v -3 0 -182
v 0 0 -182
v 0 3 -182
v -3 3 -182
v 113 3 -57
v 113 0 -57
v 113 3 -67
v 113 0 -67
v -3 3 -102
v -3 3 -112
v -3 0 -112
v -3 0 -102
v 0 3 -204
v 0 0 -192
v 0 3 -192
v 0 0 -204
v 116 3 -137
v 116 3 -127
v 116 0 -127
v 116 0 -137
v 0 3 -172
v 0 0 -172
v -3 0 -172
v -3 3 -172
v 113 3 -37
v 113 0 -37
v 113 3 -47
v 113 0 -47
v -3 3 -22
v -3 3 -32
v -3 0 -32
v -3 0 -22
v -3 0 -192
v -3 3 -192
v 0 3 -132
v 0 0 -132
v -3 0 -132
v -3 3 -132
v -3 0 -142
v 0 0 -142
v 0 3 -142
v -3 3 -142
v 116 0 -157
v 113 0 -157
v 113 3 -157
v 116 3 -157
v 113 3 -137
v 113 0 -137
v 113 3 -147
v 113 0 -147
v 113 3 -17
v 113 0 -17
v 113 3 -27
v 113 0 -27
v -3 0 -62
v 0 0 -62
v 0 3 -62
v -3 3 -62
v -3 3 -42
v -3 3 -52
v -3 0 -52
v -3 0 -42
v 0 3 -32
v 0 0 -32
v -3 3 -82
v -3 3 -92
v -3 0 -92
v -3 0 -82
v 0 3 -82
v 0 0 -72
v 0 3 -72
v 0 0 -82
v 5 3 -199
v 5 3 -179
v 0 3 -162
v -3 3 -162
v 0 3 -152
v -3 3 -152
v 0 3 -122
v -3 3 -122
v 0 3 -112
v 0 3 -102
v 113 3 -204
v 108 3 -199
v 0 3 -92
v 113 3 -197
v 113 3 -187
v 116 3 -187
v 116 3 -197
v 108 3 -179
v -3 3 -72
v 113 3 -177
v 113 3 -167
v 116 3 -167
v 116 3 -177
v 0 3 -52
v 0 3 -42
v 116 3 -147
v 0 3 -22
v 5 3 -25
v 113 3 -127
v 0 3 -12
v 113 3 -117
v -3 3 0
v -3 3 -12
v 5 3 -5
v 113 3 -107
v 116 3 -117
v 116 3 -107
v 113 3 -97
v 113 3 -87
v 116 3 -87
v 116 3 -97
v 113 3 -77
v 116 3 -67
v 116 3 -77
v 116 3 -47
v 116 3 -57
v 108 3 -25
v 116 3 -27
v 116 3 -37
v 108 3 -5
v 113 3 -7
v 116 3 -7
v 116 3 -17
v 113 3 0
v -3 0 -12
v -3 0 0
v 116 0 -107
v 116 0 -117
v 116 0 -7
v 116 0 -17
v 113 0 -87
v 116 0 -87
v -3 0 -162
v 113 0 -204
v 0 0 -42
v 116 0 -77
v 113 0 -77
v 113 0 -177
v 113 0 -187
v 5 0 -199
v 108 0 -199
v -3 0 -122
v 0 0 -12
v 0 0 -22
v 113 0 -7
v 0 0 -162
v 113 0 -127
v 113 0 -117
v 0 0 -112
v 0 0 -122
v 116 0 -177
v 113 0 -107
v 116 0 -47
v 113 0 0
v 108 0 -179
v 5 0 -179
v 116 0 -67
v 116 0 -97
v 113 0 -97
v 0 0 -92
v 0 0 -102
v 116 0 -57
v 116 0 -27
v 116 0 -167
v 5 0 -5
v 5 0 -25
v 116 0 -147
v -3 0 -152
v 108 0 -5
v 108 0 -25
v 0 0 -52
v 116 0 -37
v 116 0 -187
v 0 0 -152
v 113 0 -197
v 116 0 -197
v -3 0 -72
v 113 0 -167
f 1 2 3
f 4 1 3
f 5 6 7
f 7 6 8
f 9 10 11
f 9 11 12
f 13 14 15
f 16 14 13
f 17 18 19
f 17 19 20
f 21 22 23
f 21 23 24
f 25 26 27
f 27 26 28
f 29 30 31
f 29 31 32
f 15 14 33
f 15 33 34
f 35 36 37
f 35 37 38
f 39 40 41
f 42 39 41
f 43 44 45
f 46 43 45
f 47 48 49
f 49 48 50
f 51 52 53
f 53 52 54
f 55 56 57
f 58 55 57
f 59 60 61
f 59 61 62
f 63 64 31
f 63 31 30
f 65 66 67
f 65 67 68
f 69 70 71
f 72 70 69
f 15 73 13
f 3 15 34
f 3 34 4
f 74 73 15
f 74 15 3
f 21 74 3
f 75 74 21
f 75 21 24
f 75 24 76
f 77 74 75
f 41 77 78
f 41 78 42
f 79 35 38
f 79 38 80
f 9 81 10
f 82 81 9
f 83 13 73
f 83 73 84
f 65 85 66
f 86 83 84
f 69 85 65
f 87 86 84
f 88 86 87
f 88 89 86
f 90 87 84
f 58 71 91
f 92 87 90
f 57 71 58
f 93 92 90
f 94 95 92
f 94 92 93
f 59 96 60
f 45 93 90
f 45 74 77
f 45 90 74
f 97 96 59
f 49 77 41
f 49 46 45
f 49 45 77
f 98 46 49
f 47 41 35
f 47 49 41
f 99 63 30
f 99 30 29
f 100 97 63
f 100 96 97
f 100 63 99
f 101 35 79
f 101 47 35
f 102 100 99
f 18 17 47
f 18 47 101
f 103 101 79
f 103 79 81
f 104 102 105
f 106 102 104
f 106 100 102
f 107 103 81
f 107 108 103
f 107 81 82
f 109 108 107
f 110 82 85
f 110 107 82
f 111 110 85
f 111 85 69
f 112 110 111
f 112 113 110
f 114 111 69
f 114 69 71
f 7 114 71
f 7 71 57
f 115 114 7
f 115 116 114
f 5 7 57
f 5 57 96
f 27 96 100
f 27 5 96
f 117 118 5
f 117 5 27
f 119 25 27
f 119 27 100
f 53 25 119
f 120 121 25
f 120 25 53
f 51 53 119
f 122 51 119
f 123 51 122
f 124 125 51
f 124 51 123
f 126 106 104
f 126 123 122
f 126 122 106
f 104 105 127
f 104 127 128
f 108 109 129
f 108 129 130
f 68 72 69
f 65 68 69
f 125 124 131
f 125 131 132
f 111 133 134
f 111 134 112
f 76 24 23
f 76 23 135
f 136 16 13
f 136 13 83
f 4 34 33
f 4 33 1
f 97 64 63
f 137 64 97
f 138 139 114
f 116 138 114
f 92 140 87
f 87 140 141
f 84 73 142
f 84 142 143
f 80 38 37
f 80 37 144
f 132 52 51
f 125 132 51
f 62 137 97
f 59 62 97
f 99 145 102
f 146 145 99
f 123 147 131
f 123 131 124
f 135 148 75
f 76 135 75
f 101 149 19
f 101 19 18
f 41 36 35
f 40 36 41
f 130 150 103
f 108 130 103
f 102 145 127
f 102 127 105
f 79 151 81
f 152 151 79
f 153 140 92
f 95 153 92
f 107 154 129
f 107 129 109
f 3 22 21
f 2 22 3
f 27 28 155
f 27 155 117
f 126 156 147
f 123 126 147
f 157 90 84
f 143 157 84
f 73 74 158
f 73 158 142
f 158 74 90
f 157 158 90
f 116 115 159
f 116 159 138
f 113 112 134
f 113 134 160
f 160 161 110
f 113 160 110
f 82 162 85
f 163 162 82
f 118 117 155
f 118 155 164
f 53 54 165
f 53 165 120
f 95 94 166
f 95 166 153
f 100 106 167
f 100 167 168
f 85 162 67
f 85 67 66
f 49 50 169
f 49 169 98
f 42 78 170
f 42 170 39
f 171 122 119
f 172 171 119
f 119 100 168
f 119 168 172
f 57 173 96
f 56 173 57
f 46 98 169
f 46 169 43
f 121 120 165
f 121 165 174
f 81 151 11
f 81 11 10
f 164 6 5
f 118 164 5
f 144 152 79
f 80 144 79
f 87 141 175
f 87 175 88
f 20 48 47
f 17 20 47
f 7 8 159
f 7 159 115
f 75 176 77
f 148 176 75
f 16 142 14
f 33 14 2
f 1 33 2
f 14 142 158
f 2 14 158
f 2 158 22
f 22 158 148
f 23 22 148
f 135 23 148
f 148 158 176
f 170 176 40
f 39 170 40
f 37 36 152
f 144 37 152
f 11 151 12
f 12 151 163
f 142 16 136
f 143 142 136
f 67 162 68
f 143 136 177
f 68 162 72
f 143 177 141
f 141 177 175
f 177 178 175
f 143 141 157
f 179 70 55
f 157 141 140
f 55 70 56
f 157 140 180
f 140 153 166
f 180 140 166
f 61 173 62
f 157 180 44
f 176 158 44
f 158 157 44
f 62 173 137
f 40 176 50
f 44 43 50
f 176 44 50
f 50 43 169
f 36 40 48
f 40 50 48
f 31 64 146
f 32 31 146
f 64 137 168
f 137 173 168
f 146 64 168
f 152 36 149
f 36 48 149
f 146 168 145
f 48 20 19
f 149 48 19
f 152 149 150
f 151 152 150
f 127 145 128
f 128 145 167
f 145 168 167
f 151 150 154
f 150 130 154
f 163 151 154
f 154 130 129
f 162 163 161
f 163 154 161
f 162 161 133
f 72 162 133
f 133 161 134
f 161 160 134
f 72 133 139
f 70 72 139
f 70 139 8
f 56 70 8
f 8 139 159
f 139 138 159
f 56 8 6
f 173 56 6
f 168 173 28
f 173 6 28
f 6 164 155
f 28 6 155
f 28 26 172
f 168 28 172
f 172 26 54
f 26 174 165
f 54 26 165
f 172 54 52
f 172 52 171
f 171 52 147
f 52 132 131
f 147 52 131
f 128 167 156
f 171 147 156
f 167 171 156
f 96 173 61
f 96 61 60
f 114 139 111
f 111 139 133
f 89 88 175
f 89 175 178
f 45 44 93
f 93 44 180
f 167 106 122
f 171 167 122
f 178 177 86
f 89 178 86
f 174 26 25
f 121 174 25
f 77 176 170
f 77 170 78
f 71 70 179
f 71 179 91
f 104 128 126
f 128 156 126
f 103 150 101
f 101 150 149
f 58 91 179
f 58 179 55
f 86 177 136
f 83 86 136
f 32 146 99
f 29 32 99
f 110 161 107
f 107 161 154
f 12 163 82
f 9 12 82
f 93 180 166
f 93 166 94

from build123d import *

# Parameters (mm, degrees)
SKETCH1_W           = 113
SKETCH1_H           = 204
BOSS_EXTRUDE1_DEPTH = 3
SKETCH2_W           = 10
SKETCH2_H           = 3
BOSS_EXTRUDE2_DEPTH = 3
LPATTERN1_COUNT     = 10
LPATTERN1_PITCH     = 20
SKETCH4_W           = 103
SKETCH4_H           = 20
CUT_EXTRUDE1_DEPTH  = 4
SKETCH3_W           = 12
SKETCH3_H           = 3
SKETCH3_W_2         = 10
BOSS_EXTRUDE3_DEPTH = 3


with BuildPart() as part:
    # Sketch1 → Boss-Extrude1 (new body)
    with BuildSketch(Plane(origin=(0, 0, 0), x_dir=(1, 0, 0), z_dir=(0, 1, 0))):
        with Locations((56.5, 102)):
            Rectangle(SKETCH1_W, SKETCH1_H)
    extrude(amount=BOSS_EXTRUDE1_DEPTH)

    # Sketch2 → Boss-Extrude2 (add)
    with BuildSketch(Plane(origin=(113, 0, 0), x_dir=(0, 0, -1), z_dir=(1, 0, 0))):
        with Locations((12, 1.5)):
            Rectangle(SKETCH2_W, SKETCH2_H)
    boss_extrude2 = extrude(amount=BOSS_EXTRUDE2_DEPTH)

    # LPattern1: Boss-Extrude2 ×10
    with Locations(*[(0, 0, -i * LPATTERN1_PITCH) for i in range(1, LPATTERN1_COUNT)]):
        add(boss_extrude2)

    # Sketch4 → Cut-Extrude1 (cut, through all)
    with BuildSketch(Plane(origin=(0, 3, 0), x_dir=(1, 0, 0), z_dir=(0, 1, 0))):
        with Locations((56.5, 15)):
            Rectangle(SKETCH4_W, SKETCH4_H)
        with Locations((56.5, 189)):
            Rectangle(SKETCH4_W, SKETCH4_H)
    extrude(amount=-CUT_EXTRUDE1_DEPTH, mode=Mode.SUBTRACT)

    # Sketch3 → Boss-Extrude3 (add)
    with BuildSketch(Plane.ZY):
        with Locations((-6, 1.5)):
            Rectangle(SKETCH3_W, SKETCH3_H)
        with Locations((-27, 1.5)):
            Rectangle(SKETCH3_W_2, SKETCH3_H)
        with Locations((-47, 1.5)):
            Rectangle(SKETCH3_W_2, SKETCH3_H)
        with Locations((-67, 1.5)):
            Rectangle(SKETCH3_W_2, SKETCH3_H)
        with Locations((-87, 1.5)):
            Rectangle(SKETCH3_W_2, SKETCH3_H)
        with Locations((-107, 1.5)):
            Rectangle(SKETCH3_W_2, SKETCH3_H)
        with Locations((-127, 1.5)):
            Rectangle(SKETCH3_W_2, SKETCH3_H)
        with Locations((-147, 1.5)):
            Rectangle(SKETCH3_W_2, SKETCH3_H)
        with Locations((-167, 1.5)):
            Rectangle(SKETCH3_W_2, SKETCH3_H)
        with Locations((-187, 1.5)):
            Rectangle(SKETCH3_W_2, SKETCH3_H)
    extrude(amount=BOSS_EXTRUDE3_DEPTH)


solid = part.part
